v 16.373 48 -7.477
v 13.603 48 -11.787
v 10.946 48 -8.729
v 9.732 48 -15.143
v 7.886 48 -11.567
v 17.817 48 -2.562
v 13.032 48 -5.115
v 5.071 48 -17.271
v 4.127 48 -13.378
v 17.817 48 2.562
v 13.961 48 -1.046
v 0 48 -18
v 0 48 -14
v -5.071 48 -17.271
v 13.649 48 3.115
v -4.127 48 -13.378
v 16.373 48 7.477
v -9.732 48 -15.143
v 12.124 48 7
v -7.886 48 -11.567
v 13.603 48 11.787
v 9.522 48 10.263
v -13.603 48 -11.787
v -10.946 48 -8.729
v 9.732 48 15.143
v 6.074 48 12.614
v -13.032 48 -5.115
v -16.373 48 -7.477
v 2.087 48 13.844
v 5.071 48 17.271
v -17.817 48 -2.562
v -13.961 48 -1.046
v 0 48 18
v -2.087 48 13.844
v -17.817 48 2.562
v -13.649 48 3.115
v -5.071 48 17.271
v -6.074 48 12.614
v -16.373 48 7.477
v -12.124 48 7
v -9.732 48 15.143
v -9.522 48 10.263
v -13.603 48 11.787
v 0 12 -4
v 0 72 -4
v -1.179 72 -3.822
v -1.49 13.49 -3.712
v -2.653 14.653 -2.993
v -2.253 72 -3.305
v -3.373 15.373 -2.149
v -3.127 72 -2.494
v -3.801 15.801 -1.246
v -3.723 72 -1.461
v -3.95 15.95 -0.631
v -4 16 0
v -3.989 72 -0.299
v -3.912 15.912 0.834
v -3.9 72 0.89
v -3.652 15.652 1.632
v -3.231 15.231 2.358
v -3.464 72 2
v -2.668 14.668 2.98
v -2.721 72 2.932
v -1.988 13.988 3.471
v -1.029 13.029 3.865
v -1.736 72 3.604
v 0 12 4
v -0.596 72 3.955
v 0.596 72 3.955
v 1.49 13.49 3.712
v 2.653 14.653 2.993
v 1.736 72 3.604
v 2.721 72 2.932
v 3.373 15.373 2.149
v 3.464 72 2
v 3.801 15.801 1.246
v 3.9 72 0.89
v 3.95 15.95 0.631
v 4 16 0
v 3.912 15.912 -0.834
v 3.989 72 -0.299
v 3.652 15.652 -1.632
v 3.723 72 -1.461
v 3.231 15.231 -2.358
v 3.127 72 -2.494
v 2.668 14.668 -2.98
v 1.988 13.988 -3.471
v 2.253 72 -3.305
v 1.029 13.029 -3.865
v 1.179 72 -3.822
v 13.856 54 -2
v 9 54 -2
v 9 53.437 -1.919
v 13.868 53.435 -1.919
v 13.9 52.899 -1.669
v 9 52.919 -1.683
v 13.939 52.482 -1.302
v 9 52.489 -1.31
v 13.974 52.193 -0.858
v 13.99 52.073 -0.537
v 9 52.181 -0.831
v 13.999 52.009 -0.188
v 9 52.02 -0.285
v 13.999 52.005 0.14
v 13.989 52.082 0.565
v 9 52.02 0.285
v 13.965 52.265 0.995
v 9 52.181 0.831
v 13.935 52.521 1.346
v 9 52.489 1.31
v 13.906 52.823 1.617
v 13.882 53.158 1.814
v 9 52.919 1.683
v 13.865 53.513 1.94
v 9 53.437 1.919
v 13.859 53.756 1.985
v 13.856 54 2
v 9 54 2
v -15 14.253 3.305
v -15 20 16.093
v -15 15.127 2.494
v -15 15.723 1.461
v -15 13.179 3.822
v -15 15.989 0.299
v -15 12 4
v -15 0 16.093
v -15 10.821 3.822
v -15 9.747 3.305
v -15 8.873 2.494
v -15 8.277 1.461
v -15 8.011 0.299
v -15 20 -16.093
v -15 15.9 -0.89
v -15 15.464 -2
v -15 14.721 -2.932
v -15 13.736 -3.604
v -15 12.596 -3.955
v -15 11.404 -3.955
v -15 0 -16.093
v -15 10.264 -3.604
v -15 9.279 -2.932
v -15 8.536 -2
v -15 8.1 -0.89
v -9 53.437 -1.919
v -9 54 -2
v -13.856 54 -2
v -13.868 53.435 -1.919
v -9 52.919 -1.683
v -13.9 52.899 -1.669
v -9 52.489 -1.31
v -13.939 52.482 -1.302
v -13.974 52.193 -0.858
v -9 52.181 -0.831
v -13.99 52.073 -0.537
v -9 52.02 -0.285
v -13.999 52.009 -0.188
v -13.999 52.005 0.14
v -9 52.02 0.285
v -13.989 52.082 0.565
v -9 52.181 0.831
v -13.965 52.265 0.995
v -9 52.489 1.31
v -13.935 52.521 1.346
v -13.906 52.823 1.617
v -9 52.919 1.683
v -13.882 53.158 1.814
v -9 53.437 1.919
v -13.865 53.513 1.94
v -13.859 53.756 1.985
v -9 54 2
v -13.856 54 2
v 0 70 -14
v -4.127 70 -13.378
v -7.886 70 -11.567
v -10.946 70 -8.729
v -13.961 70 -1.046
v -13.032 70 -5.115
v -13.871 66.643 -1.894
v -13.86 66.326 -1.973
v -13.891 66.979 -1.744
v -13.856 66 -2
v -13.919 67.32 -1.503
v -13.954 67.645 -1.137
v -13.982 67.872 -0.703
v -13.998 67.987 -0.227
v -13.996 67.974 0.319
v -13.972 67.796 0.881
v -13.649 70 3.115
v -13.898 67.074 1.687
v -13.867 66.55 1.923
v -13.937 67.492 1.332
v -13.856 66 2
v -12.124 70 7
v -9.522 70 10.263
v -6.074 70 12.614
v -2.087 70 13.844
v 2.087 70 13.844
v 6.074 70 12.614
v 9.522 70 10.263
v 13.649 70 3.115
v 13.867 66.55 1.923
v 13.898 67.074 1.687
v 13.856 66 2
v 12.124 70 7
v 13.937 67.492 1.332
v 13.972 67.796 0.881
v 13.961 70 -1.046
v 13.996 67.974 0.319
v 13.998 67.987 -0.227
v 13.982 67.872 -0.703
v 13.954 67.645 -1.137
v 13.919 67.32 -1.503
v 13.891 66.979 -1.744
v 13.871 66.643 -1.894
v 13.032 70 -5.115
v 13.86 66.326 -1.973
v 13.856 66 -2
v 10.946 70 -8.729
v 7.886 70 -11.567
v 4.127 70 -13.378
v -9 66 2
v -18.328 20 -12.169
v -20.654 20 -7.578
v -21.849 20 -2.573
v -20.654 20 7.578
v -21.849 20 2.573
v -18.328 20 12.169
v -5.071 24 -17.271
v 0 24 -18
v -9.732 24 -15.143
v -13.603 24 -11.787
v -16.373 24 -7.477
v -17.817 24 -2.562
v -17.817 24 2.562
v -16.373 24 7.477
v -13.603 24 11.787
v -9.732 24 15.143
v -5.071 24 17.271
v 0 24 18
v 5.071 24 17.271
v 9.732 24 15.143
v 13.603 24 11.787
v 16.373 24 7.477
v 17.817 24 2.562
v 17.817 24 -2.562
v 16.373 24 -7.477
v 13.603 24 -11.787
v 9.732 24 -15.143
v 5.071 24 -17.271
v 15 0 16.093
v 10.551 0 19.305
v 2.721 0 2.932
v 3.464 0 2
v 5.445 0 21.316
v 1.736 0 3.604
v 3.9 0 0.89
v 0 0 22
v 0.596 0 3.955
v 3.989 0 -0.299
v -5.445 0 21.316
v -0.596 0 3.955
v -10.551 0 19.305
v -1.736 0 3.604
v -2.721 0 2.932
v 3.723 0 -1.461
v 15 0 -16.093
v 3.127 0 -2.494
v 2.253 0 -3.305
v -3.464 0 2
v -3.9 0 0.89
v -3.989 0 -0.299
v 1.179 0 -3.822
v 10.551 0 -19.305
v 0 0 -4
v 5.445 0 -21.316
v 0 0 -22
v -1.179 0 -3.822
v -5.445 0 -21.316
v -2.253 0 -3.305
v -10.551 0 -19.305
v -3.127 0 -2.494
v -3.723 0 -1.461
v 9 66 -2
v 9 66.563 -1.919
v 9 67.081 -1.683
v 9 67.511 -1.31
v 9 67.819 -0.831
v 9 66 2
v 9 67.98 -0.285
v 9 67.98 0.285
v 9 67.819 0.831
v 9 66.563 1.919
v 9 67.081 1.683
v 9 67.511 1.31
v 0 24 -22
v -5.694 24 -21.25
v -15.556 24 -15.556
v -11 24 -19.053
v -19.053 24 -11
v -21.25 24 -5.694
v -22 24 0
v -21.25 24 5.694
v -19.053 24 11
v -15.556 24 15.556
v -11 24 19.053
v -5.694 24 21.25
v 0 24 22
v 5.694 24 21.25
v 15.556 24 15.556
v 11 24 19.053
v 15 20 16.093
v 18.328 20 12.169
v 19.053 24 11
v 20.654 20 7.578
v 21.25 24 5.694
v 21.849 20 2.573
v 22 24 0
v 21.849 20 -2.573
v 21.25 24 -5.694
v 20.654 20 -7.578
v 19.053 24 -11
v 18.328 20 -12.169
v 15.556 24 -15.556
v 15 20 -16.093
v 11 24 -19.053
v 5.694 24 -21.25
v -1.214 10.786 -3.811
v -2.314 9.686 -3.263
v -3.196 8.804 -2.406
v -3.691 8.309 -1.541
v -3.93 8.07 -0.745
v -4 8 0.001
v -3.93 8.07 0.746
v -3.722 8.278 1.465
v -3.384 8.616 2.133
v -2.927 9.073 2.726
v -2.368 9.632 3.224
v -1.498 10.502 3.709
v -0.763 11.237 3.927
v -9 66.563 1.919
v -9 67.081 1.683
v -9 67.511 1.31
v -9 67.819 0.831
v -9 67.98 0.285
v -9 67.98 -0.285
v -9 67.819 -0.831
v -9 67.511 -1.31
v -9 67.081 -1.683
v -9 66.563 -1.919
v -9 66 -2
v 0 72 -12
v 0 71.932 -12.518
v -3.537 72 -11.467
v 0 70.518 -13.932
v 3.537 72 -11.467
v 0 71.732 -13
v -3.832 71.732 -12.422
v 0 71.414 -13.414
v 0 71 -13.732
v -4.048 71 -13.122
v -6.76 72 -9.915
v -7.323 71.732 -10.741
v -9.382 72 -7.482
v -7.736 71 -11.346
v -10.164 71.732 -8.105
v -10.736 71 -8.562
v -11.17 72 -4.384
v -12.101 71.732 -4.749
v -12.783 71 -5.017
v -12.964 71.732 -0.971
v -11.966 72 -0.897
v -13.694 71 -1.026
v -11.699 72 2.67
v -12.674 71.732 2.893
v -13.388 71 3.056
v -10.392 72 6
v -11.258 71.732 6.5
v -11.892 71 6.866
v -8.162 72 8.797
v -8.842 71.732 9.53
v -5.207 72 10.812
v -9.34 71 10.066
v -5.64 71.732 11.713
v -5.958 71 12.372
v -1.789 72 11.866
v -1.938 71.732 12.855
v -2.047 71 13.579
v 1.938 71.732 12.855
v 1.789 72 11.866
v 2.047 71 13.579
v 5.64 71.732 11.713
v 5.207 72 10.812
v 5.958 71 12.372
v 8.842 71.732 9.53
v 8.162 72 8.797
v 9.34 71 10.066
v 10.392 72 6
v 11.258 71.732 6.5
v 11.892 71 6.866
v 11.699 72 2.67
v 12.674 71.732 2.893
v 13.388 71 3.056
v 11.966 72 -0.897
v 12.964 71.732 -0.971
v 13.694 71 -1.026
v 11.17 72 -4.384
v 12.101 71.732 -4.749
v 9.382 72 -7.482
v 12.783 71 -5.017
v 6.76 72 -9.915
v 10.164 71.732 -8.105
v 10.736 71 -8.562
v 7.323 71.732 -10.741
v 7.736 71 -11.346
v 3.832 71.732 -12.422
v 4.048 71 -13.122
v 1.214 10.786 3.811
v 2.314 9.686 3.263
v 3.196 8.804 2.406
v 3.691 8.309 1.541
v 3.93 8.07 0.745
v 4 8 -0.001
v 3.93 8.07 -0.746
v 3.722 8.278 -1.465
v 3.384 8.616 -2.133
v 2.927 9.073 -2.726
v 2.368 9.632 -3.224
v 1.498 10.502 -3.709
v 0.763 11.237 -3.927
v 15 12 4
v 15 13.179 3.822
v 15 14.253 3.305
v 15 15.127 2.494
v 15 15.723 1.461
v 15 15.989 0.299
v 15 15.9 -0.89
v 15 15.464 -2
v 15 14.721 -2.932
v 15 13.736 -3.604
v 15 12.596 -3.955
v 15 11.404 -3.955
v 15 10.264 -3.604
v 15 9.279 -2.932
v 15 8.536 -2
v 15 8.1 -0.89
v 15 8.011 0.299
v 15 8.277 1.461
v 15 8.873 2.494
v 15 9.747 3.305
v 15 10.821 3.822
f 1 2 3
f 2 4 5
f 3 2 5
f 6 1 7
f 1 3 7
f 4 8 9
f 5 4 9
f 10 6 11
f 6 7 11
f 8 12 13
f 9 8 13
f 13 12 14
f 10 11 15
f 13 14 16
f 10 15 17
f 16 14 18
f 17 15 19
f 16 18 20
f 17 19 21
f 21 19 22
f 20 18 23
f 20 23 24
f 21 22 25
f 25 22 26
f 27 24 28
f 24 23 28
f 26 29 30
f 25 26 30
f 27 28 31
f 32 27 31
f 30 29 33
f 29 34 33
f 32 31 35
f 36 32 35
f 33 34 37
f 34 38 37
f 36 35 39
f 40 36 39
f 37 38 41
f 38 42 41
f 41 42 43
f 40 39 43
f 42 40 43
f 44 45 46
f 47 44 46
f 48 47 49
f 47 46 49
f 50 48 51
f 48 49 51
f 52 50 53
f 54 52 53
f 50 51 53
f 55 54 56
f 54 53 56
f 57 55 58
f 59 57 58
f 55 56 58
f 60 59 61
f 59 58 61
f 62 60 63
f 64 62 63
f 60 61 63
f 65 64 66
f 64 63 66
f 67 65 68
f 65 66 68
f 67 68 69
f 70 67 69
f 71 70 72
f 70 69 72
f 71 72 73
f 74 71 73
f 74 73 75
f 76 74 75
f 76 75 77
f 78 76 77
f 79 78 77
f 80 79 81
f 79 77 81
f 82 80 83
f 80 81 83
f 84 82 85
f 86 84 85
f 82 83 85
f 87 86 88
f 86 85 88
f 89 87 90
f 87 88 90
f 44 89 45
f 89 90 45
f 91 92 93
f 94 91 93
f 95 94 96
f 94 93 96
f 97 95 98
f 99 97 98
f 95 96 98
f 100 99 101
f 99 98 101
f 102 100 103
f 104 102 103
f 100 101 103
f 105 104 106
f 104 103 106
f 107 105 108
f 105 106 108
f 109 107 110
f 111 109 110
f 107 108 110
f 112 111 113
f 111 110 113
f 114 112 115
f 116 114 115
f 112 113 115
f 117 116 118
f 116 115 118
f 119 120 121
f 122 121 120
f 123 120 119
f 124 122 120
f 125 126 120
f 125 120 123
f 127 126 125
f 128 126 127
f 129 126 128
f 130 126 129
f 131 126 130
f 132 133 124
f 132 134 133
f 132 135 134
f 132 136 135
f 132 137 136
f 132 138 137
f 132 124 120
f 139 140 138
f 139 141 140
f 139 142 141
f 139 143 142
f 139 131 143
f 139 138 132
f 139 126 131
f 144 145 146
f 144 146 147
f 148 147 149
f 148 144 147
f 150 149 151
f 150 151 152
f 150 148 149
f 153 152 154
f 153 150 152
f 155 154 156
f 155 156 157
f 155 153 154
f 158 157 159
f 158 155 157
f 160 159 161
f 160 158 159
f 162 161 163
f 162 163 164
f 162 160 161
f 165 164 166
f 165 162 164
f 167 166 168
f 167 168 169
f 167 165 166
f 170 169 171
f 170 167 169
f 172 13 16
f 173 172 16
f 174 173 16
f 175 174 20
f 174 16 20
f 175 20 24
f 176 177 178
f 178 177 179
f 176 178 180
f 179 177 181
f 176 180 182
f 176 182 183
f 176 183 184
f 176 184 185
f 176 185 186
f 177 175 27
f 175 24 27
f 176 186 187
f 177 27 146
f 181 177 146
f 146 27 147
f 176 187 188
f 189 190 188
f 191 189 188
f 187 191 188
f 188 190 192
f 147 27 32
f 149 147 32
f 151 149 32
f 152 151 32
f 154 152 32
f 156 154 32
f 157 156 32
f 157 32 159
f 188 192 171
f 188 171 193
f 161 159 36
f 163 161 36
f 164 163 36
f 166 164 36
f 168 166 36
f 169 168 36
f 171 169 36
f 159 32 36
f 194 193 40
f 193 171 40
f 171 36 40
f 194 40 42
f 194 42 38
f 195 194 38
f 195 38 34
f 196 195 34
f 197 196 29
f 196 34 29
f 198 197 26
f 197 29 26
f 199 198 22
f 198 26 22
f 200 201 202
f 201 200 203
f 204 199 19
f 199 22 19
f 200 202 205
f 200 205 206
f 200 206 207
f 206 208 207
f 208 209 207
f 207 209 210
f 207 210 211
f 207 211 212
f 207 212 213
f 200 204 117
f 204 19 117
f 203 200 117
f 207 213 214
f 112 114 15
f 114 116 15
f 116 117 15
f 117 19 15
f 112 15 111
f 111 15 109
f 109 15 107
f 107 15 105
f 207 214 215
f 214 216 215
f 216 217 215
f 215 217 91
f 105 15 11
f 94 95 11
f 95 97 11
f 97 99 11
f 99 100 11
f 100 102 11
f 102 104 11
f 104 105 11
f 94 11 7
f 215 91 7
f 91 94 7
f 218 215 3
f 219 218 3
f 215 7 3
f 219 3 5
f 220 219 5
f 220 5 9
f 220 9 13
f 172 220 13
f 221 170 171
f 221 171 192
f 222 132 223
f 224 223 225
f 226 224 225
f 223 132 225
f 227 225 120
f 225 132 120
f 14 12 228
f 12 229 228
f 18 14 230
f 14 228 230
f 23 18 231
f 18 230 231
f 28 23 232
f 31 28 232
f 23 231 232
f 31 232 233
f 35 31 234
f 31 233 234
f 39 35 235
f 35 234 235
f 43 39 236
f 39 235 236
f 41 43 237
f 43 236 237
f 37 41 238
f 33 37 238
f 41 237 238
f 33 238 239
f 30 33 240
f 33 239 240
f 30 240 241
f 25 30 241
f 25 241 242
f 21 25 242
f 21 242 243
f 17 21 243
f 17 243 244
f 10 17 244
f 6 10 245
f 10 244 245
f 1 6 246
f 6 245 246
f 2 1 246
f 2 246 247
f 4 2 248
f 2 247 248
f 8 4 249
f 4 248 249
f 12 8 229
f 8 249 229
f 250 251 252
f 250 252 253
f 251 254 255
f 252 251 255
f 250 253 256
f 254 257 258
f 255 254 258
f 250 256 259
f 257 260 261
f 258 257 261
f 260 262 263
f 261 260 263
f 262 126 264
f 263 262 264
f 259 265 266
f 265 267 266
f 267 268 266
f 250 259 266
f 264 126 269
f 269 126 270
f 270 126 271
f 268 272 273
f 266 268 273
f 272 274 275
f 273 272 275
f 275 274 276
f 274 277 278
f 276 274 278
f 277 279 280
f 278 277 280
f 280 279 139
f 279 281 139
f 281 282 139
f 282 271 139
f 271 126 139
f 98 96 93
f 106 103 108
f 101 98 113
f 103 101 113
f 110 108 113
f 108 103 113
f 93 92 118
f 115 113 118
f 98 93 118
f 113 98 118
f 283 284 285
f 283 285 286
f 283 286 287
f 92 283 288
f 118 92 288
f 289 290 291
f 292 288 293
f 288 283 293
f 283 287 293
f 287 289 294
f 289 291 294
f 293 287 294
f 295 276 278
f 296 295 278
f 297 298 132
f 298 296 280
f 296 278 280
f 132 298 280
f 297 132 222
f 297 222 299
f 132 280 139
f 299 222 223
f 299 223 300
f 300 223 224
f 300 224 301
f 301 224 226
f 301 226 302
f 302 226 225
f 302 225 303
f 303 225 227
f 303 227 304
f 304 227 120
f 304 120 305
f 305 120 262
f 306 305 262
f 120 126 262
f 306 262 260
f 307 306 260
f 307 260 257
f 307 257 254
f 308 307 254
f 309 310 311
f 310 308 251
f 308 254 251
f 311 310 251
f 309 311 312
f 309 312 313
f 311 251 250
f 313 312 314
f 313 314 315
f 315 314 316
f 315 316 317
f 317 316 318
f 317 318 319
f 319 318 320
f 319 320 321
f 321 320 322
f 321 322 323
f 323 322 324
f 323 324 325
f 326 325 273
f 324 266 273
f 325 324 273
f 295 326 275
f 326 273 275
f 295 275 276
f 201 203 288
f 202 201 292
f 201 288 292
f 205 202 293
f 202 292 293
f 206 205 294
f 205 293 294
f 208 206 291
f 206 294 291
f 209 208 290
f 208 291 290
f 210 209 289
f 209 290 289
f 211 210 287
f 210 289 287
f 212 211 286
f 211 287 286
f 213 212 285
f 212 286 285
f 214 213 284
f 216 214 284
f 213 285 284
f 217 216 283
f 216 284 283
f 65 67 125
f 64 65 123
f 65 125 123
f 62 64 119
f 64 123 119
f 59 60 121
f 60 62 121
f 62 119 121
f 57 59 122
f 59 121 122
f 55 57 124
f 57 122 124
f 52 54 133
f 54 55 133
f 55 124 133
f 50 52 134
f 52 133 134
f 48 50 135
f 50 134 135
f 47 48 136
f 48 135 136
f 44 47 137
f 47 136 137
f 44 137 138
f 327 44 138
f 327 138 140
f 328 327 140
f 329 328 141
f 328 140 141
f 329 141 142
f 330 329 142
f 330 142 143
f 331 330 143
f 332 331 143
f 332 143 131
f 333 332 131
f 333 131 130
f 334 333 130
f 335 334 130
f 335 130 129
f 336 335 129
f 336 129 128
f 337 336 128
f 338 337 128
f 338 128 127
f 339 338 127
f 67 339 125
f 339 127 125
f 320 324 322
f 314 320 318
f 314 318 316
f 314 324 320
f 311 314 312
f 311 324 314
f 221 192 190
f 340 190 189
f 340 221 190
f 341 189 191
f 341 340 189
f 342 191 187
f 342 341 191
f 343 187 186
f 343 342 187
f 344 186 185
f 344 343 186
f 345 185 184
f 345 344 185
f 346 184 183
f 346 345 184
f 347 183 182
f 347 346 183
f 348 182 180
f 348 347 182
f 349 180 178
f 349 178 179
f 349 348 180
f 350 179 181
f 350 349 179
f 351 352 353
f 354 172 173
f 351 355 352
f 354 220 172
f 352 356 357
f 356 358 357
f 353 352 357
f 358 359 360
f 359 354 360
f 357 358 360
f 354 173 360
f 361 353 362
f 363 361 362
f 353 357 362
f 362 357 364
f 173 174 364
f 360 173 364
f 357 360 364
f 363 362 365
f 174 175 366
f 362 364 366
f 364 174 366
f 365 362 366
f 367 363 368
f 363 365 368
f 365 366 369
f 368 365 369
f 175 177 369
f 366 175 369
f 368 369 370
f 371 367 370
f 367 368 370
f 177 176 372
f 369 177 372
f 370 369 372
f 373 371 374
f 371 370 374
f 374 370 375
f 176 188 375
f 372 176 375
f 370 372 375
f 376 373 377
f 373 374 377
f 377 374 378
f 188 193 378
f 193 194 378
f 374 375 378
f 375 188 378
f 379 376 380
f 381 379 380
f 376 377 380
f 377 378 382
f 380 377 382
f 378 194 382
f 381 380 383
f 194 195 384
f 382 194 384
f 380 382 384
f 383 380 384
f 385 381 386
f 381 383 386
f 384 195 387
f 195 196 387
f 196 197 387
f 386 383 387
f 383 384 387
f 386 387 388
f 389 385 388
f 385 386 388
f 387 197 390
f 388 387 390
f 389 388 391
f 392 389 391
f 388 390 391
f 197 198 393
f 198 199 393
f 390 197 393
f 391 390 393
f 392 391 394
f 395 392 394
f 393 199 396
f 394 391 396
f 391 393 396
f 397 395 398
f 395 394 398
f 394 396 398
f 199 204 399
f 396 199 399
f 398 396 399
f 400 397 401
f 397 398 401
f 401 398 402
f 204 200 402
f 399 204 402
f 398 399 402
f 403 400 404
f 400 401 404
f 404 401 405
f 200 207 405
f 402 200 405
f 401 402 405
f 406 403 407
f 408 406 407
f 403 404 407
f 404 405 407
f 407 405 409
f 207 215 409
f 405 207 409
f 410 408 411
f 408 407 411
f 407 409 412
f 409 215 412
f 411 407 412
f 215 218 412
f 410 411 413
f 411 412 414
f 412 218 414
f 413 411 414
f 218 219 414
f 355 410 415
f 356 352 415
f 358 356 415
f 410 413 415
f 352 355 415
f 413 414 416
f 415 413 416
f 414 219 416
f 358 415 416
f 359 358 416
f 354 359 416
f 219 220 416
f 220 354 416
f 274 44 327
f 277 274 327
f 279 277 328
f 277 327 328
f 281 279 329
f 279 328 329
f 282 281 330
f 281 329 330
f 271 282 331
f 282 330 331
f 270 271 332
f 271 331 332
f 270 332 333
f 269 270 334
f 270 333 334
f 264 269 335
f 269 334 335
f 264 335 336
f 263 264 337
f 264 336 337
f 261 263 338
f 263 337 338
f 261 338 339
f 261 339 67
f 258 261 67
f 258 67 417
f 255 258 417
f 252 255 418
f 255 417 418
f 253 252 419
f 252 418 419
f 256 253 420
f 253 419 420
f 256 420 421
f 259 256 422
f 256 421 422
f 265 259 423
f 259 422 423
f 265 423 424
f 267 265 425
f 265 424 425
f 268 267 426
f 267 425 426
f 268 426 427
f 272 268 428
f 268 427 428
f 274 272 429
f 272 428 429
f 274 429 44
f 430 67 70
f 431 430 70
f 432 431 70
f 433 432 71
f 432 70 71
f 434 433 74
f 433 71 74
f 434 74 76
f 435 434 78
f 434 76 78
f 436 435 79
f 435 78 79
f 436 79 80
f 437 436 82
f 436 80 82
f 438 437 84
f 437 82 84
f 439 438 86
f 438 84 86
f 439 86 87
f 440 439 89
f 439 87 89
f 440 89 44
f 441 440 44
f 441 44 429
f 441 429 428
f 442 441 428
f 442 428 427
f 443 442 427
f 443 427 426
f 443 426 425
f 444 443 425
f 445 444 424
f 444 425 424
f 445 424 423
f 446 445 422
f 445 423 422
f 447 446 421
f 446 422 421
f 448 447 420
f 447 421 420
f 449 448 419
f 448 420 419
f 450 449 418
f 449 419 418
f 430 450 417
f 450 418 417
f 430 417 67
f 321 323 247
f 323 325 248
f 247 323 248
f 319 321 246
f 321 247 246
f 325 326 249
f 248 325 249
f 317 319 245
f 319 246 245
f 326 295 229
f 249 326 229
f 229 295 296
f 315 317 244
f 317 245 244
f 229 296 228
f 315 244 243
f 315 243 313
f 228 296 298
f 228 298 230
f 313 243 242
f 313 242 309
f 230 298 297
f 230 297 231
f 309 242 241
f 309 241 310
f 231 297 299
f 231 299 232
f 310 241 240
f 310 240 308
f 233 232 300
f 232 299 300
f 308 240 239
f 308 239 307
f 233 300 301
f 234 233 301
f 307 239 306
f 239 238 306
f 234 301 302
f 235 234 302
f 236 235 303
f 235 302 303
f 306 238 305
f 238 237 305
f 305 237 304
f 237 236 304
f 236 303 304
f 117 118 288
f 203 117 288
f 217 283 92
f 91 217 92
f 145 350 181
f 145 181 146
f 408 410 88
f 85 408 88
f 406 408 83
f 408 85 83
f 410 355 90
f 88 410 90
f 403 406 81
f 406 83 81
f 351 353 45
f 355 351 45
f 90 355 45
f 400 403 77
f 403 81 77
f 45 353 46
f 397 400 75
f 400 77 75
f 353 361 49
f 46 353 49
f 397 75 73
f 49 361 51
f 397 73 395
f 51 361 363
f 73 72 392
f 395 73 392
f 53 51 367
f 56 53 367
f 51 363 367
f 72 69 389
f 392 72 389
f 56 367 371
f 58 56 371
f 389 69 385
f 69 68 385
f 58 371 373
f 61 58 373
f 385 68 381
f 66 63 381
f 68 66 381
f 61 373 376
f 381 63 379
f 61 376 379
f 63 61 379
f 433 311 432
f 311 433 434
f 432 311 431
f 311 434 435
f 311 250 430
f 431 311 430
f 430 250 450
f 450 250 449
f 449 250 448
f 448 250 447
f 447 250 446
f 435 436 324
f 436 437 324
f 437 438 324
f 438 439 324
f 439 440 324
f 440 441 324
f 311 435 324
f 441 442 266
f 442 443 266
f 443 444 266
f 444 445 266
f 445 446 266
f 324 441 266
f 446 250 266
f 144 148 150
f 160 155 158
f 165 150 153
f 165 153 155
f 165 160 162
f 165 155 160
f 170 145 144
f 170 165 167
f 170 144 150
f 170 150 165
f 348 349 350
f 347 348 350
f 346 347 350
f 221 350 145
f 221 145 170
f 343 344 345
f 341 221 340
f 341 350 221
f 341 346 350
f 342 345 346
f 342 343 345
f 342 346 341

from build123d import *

# Parameters (mm, degrees)
CUT_EXTRUDE1_DEPTH = 20
CUT_EXTRUDE2_START = 9
CUT_EXTRUDE2_DEPTH = 20
HOLE1_D            = 8
FILLET1_R          = 2


with BuildPart() as part:
    # Sketch1 → Revolve1 (revolve)
    with BuildSketch(Plane.XY, mode=Mode.PRIVATE) as revolve1_sk:
        Polygon((4, 0), (4, 72), (14, 72), (14, 48), (18, 48), (18, 24), (22, 24), (22, 0), align=None)
    revolve(revolve1_sk.sketch.rotate(Axis((0, 0, 0), (0, 1, 0)), 90), axis=Axis((0, 0, 0), (0, 1, 0)))

    # Sketch2 → Cut-Extrude1 (cut)
    with BuildSketch(Plane.XZ):
        with BuildLine():
            Line((15, 16.093476939), (15, -16.093476939))
            ThreePointArc((15, -16.093476939), (22, 0), (15, 16.093476939))
        make_face()
    cut_extrude1 = extrude(amount=-CUT_EXTRUDE1_DEPTH, mode=Mode.SUBTRACT)

    # Sketch3 → Cut-Extrude2 (cut)
    with BuildSketch(Plane(origin=(0, 0, 0), x_dir=(0, 0, -1), z_dir=(1, 0, 0)).offset(CUT_EXTRUDE2_START)):
        with BuildLine():
            Line((2, 66), (2, 54))
            ThreePointArc((2, 54), (0, 52), (-2, 54))
            Line((-2, 54), (-2, 66))
            ThreePointArc((-2, 66), (0, 68), (2, 66))
        make_face()
    cut_extrude2 = extrude(amount=CUT_EXTRUDE2_DEPTH, mode=Mode.SUBTRACT)

    # Hole1 (through all)
    with Locations(Plane(origin=(15, 0, 0), x_dir=(0, 0, -1), z_dir=(1, 0, 0))):
        with Locations((0, 12)):
            Hole(HOLE1_D / 2)

    # Mirror2: Cut-Extrude2 across plane
    add(cut_extrude2.mirror(Plane(origin=(0, 0, 0), x_dir=(0, 0, 1), z_dir=(1, 0, 0))), mode=Mode.SUBTRACT)

    # Mirror3: Cut-Extrude1 across plane
    add(cut_extrude1.mirror(Plane(origin=(0, 0, 0), x_dir=(0, 0, 1), z_dir=(1, 0, 0))), mode=Mode.SUBTRACT)

    # Fillet1
    fillet1_edges = [part.edges().sort_by_distance(p)[0] for p in [
        (0, 72, 14),
    ]]
    fillet(fillet1_edges, radius=FILLET1_R)


solid = part.part
